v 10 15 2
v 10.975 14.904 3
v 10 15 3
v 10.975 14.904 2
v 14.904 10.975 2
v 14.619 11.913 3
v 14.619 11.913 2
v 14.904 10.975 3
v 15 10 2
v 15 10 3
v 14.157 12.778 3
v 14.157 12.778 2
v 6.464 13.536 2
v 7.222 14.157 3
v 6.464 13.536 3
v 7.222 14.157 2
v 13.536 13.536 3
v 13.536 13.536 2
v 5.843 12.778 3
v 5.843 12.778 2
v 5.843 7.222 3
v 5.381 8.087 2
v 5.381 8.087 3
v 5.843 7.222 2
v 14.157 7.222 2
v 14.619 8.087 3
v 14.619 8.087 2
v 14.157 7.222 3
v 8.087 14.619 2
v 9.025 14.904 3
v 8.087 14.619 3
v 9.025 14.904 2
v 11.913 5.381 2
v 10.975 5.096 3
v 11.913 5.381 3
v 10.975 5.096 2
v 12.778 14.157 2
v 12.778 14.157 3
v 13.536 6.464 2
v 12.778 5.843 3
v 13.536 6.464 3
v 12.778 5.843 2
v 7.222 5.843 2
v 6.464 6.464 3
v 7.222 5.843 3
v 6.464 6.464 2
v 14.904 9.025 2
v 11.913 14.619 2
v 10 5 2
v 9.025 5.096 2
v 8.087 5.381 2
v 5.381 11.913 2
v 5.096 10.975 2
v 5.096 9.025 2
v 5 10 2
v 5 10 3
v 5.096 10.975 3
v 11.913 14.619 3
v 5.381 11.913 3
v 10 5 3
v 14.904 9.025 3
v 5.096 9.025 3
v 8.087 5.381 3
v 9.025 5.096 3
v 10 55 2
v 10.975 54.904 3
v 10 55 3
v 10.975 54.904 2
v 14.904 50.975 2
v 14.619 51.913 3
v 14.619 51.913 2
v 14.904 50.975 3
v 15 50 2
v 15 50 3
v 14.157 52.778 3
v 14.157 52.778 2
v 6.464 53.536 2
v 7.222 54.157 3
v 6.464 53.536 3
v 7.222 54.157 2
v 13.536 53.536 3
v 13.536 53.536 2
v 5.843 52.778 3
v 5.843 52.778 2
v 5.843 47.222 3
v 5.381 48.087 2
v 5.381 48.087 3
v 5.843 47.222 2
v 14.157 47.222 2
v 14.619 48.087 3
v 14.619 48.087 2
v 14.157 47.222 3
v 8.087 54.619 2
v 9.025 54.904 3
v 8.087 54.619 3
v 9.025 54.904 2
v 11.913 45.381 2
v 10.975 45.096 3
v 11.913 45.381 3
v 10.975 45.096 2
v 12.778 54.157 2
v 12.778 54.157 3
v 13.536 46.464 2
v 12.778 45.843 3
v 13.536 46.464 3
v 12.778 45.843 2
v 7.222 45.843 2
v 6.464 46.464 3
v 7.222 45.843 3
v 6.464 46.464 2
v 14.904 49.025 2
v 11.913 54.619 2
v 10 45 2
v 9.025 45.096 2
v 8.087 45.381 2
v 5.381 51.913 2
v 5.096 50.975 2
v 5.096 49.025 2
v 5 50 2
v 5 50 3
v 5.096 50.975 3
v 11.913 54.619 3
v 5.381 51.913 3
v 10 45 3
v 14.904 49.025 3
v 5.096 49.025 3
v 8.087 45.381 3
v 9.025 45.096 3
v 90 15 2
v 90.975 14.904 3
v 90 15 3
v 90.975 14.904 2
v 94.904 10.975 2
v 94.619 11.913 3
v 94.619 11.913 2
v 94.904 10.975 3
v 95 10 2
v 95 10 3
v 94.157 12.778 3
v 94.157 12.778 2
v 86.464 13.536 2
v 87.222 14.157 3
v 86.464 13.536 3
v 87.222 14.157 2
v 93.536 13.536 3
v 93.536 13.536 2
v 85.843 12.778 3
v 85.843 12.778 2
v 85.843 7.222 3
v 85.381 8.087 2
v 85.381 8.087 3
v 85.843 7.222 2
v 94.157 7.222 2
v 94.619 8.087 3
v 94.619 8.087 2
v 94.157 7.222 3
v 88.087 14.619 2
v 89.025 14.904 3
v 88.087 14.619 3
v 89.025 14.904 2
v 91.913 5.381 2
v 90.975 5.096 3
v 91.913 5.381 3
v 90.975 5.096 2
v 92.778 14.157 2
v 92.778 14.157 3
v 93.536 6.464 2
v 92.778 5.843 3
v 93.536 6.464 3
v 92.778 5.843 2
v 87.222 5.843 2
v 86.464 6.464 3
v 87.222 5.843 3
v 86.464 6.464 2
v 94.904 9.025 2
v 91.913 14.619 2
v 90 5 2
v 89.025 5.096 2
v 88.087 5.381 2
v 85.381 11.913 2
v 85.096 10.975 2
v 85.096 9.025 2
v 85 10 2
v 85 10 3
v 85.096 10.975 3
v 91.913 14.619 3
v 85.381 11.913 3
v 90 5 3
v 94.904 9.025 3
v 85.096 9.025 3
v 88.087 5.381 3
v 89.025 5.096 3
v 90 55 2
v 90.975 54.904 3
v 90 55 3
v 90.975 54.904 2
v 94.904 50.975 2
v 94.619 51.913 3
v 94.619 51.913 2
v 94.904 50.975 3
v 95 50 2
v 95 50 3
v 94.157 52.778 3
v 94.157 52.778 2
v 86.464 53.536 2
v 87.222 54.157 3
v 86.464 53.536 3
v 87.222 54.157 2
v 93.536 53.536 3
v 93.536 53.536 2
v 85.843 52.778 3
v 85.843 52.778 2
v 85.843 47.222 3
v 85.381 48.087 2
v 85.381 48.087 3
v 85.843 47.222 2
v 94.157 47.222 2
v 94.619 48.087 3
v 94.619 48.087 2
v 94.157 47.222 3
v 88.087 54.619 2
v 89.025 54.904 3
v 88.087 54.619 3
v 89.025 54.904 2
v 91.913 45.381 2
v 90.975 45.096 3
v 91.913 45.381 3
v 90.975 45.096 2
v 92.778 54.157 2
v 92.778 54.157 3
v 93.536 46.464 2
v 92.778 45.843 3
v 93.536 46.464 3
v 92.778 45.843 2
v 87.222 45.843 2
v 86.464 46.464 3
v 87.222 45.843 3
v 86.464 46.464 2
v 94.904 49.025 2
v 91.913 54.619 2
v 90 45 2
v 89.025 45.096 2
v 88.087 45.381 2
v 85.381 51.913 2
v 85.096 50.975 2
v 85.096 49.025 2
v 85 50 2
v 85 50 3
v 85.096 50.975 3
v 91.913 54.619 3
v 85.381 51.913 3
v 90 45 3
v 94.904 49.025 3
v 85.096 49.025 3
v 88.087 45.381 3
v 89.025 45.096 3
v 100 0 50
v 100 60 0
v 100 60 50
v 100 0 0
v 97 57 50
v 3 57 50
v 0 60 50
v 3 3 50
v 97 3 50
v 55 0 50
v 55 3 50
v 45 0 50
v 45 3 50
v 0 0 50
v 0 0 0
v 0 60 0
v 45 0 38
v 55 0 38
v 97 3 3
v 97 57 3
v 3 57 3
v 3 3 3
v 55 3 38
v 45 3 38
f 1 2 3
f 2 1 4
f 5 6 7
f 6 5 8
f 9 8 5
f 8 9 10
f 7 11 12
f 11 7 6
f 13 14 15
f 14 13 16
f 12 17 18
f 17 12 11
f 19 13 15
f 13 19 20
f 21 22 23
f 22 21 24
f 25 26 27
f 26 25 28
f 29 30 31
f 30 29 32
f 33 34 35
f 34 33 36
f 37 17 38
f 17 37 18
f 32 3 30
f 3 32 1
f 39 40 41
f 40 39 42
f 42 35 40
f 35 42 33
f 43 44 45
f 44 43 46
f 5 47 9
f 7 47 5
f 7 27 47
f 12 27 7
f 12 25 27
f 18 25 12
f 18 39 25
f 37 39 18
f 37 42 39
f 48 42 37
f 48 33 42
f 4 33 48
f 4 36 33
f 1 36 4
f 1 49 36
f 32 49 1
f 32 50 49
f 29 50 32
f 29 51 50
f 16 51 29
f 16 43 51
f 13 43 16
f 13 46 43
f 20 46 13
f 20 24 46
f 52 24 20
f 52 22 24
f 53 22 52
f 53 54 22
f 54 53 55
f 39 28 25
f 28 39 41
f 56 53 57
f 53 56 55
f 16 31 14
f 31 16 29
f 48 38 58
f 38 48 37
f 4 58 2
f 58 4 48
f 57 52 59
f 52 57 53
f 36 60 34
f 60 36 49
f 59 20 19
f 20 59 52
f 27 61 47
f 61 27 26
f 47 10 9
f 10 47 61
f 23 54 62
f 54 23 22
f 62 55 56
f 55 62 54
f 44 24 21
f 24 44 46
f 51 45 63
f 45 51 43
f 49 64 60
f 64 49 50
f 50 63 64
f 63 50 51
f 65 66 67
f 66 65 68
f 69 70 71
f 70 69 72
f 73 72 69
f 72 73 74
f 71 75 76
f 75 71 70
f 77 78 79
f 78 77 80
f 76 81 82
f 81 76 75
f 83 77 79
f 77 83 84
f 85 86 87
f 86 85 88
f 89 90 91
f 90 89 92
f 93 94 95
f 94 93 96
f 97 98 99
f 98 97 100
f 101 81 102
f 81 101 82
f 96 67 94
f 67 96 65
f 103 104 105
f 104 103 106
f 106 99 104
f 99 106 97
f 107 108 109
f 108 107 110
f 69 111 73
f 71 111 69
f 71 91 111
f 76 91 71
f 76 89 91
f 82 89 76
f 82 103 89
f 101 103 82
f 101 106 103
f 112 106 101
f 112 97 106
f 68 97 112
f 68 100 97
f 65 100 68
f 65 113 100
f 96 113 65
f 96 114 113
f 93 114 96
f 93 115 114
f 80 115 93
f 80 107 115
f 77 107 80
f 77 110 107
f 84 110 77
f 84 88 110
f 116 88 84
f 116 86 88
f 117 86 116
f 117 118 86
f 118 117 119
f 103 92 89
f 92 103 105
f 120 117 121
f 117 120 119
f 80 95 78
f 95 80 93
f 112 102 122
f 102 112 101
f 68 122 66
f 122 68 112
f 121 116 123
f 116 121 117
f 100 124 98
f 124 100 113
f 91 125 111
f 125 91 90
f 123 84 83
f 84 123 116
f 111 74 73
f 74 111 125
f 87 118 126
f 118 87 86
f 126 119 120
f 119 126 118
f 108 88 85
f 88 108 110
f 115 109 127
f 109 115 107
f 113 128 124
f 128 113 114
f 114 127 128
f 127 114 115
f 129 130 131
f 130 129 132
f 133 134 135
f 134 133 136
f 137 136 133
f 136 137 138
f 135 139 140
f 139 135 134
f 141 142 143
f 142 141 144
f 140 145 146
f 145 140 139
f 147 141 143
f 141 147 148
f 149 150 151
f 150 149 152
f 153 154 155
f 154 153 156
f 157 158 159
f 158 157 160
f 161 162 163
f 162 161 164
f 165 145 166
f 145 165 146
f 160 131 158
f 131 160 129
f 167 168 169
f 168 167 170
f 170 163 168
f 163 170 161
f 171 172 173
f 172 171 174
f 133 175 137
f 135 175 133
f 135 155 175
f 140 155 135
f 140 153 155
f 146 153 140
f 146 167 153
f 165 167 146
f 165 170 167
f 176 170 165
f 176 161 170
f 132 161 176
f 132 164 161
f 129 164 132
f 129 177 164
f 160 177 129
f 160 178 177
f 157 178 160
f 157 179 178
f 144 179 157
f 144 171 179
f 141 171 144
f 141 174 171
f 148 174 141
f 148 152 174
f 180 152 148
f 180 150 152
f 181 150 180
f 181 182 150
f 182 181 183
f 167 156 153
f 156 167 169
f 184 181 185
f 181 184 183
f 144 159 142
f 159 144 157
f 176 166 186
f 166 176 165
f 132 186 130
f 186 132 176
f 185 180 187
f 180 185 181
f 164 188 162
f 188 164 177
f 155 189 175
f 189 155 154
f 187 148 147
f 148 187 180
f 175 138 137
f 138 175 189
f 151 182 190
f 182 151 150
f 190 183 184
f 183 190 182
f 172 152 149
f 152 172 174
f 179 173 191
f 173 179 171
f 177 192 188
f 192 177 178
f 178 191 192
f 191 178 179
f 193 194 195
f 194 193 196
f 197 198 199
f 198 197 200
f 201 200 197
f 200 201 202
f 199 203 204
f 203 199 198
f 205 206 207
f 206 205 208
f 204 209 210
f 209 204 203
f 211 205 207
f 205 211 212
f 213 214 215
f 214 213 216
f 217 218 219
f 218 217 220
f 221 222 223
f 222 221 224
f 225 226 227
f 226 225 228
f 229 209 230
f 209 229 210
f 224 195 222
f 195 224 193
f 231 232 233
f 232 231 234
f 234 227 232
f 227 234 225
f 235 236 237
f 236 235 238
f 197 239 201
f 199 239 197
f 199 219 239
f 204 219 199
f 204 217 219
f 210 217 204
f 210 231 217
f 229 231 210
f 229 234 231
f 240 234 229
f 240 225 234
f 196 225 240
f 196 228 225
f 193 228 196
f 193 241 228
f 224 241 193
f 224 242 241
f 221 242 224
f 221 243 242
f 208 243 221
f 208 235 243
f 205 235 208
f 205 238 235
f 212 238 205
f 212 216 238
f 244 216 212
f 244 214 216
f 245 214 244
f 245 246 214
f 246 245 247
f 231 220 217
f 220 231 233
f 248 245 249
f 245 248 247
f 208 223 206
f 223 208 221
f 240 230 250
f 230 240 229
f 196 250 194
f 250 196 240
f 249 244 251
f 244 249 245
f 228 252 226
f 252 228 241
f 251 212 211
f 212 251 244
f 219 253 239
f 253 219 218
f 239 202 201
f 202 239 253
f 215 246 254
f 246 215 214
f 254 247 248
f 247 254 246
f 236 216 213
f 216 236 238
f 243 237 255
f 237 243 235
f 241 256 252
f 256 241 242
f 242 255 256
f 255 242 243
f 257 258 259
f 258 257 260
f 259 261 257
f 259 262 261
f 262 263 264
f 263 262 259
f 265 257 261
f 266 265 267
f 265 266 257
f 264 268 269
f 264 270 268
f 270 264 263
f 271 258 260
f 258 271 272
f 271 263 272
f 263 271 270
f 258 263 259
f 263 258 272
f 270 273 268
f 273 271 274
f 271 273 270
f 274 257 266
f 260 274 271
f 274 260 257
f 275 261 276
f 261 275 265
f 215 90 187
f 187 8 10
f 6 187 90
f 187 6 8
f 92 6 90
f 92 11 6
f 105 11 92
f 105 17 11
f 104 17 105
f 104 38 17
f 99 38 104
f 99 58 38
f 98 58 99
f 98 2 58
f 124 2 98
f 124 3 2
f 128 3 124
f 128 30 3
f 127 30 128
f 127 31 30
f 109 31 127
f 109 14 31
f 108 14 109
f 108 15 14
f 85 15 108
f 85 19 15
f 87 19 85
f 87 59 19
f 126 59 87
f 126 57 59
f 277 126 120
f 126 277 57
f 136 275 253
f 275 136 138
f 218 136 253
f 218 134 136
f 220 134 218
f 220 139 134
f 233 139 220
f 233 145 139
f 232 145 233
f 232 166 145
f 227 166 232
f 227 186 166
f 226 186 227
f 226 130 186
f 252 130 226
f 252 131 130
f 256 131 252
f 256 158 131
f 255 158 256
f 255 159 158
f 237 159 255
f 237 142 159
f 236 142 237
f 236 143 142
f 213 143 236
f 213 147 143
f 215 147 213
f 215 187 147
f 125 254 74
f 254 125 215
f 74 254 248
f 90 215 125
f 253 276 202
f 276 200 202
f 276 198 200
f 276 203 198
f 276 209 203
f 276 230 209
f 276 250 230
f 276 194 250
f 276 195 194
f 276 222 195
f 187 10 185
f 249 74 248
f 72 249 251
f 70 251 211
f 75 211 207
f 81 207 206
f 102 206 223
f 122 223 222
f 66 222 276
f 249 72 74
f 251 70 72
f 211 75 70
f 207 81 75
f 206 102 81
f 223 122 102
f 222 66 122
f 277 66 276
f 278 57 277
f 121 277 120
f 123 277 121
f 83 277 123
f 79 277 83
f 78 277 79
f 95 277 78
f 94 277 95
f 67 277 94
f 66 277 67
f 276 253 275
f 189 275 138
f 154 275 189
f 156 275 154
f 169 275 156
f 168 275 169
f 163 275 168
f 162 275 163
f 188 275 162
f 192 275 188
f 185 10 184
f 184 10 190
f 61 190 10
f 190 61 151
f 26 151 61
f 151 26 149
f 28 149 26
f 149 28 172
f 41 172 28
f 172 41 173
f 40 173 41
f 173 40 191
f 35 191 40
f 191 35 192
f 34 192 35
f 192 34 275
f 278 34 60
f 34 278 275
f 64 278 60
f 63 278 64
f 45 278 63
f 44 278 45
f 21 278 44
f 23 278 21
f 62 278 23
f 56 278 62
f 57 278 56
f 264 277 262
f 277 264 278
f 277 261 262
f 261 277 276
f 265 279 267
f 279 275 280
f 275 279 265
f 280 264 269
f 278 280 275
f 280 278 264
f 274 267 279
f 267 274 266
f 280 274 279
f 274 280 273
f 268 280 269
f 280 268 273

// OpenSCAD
$fn = 32;

// ----------------------------------------------------------------------
// Enclosure box: both enclosure
// ----------------------------------------------------------------------

// --- parameters (mm) ---
box_l = 100;              // outer length, X
box_w = 60;               // outer width, Y
box_h = 50;               // outer height
wall_t = 3;               // wall thickness
boss_r = 5;               // corner boss radius
hole_r = 1.5;             // boss screw hole radius
boss_in = 10;             // boss inset from the corners
notch_w = 10;             // cable notch width
notch_h = 12;             // cable notch height

inner_h = box_h - wall_t;  // cavity depth
boss_h = inner_h - 2;  // corner boss height

difference() {
  cube([box_l, box_w, box_h]);
  translate([wall_t, wall_t, wall_t])
    cube([box_l - 2 * wall_t, box_w - 2 * wall_t, box_h]);
  for (sx = [0, 1], sy = [0, 1])
    translate([sx ? box_l - boss_in : boss_in,
               sy ? box_w - boss_in : boss_in, wall_t - 1]) {
      cylinder(r = boss_r, h = boss_h);
      translate([0, 0, boss_h - 4])
        cylinder(r = hole_r, h = 5);
    }
  translate([box_l / 2 - notch_w / 2, -1, box_h - notch_h])
    cube([notch_w, wall_t + 2, notch_h + 1]);
}
